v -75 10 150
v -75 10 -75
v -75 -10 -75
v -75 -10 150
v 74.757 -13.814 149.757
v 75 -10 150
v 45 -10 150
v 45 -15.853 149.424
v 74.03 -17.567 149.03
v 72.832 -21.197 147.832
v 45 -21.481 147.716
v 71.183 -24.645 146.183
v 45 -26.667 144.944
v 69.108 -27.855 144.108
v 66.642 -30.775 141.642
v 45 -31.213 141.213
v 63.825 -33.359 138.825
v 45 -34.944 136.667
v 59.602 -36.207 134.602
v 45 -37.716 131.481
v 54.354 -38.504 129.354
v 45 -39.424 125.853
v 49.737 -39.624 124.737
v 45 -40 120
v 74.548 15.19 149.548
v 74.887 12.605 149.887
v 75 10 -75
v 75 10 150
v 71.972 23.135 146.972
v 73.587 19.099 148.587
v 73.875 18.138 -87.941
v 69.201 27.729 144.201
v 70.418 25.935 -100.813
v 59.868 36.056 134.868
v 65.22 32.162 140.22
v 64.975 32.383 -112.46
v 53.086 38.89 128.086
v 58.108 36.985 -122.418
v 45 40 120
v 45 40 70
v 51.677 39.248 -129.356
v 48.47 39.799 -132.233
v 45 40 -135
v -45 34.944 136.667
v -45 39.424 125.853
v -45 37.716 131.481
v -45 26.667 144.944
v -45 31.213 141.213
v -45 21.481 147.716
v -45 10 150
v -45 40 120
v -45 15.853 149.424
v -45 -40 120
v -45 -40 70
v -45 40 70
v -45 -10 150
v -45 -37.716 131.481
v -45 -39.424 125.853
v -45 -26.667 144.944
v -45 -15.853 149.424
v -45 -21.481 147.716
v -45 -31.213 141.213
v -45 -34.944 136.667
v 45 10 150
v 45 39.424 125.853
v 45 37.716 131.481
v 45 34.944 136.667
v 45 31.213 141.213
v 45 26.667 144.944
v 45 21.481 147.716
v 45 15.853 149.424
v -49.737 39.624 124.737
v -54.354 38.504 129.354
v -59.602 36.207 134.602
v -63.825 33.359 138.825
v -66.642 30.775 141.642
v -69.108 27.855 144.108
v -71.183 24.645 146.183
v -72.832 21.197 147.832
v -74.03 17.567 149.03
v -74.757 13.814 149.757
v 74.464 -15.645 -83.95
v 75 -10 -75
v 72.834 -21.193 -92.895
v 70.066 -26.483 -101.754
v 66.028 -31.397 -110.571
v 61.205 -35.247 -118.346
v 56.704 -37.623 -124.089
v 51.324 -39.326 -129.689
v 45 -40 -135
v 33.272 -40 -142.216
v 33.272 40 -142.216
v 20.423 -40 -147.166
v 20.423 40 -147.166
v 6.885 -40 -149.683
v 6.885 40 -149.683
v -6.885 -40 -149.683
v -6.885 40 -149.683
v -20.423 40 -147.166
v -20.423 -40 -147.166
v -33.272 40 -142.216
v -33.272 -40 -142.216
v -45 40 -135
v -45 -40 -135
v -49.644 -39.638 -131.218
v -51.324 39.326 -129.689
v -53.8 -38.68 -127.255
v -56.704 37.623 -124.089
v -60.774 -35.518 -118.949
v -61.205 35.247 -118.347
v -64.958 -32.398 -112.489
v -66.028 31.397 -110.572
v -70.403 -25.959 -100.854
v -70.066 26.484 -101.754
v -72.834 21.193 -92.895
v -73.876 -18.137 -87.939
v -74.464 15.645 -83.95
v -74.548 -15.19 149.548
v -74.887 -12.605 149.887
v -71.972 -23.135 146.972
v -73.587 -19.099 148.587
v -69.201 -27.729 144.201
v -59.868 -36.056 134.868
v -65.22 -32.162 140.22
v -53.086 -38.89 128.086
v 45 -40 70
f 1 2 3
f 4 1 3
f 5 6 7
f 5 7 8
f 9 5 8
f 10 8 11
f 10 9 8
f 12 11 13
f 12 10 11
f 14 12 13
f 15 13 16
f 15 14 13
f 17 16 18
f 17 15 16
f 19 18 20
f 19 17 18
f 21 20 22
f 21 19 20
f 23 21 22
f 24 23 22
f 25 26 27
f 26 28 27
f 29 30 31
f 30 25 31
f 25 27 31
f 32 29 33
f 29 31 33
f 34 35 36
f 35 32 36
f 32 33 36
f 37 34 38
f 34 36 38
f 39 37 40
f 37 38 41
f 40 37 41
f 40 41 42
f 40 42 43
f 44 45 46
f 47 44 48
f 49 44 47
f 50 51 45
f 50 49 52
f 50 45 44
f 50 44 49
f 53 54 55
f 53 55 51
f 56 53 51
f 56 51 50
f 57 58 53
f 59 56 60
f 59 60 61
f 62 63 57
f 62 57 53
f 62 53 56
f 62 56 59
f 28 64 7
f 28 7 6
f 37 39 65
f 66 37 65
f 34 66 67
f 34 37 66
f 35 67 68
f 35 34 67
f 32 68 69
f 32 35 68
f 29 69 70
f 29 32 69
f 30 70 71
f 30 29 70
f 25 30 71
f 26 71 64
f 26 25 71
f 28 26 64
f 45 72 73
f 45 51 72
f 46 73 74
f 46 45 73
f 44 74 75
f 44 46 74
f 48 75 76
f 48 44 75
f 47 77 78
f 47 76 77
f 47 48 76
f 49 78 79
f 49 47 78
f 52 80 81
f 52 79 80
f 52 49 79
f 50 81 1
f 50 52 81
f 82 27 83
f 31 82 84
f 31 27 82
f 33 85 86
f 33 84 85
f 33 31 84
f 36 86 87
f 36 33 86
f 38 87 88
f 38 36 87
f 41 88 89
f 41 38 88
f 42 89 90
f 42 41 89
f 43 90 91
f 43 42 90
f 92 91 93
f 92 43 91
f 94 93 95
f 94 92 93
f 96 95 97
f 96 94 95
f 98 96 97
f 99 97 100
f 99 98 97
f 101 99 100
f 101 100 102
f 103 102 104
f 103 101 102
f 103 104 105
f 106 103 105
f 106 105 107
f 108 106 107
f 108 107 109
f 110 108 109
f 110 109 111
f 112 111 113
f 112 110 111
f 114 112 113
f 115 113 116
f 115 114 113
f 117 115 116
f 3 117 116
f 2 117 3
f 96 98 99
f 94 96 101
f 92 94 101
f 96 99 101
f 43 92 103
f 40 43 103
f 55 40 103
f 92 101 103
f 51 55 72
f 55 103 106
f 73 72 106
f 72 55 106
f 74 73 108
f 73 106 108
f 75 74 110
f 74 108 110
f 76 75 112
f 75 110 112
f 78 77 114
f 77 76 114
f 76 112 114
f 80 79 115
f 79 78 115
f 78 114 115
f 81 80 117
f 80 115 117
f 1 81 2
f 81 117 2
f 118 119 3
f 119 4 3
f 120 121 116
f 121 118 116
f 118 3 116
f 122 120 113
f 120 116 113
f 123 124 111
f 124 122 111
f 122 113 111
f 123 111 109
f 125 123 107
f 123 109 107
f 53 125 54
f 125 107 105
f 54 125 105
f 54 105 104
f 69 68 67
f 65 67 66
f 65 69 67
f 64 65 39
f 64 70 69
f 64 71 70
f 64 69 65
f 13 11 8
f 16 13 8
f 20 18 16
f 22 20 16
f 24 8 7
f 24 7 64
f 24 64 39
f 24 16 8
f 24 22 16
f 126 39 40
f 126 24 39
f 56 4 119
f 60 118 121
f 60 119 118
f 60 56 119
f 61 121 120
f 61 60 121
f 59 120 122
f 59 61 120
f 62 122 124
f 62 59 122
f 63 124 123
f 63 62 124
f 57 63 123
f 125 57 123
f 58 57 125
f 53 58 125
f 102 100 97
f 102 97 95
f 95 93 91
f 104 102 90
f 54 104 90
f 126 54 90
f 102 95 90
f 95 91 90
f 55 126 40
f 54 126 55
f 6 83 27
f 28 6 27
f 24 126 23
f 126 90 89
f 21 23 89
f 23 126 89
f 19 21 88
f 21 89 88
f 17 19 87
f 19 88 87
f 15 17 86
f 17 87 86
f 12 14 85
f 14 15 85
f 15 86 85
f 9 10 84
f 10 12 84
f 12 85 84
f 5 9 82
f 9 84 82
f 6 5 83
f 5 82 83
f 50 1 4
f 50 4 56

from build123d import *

# Parameters (mm, degrees)
BOSS_EXTRUDE1_DEPTH      = 150
BOSS_EXTRUDE1_DEPTH_BACK = 150
SKETCH2_OUTSIDE_W        = 370.964
SKETCH2_OUTSIDE_H        = 150.964
CUT_EXTRUDE1_DEPTH       = 150
CUT_EXTRUDE2_REACH       = 187.809
SKETCH6_OUTSIDE_W        = 220.96400000000003
SKETCH6_OUTSIDE_H        = 370.964
CUT_EXTRUDE3_DEPTH       = 186.8090417606205


with BuildPart() as part:
    # Sketch1 → Boss-Extrude1 (new, two sides: drawn at the far end of the back side and taken through both)
    with BuildSketch(Plane.XY.offset(-BOSS_EXTRUDE1_DEPTH_BACK)):
        with BuildLine():
            Line((-44.999999999999986, -39.99999999999999), (45.000000000000014, -39.99999999999999))
            ThreePointArc((45.000000000000014, -39.99999999999999), (66.21320343559644, -31.21320343559642), (75.00000000000001, -10.000000000000002))
            Line((75.00000000000001, -10.000000000000002), (75.00000000000001, 10.000000000000002))
            ThreePointArc((75.00000000000001, 10.000000000000002), (66.21320343559645, 31.213203435596434), (45.000000000000014, 40.00000000000001))
            Line((45.000000000000014, 40.00000000000001), (-44.999999999999986, 40.00000000000001))
            ThreePointArc((-44.999999999999986, 40.00000000000001), (-66.21320343559641, 31.213203435596427), (-74.99999999999999, 10.000000000000002))
            Line((-74.99999999999999, 10.000000000000002), (-74.99999999999999, -10.000000000000002))
            ThreePointArc((-74.99999999999999, -10.000000000000002), (-66.2132034355964, -31.213203435596427), (-44.999999999999986, -39.99999999999999))
        make_face()
    extrude(amount=BOSS_EXTRUDE1_DEPTH + BOSS_EXTRUDE1_DEPTH_BACK)

    # Sketch2 outside → Cut-Extrude1 (cut)
    with BuildSketch(Plane(origin=(75.00000000000001, 0, 0), x_dir=(0, 0, -1), z_dir=(1, 0, 0))):
        Rectangle(SKETCH2_OUTSIDE_W, SKETCH2_OUTSIDE_H)
        with BuildLine():
            Line((150, 40.00000000000001), (-120, 39.999999999999986))
            ThreePointArc((-120, 39.999999999999986), (-141.21320343559643, 31.21320343559642), (-150, 9.999999999999991))
            Line((-150, 9.999999999999991), (-150, -9.999999999999991))
            ThreePointArc((-150, -9.999999999999991), (-141.21320343559643, -31.213203435596412), (-120, -39.999999999999986))
            Line((-120, -39.999999999999986), (150, -39.999999999999964))
            Line((150, -39.999999999999964), (150, 40.00000000000001))
        make_face(mode=Mode.SUBTRACT)
    extrude(amount=-CUT_EXTRUDE1_DEPTH, mode=Mode.SUBTRACT)

    # Sketch3 → Cut-Extrude2 (cut, up to next)
    with BuildSketch(Plane.XZ.offset(39.99999999999999), mode=Mode.PRIVATE) as cut_extrude2_sk1:
        Polygon((-44.99999999999978, 150), (45, 150), (45.000000000000014, 69.99999999999999), (-44.99999999999977, 69.99999999999999), align=None)
    cut_extrude2_tool1 = extrude(cut_extrude2_sk1.sketch, amount=-CUT_EXTRUDE2_REACH, mode=Mode.PRIVATE) & part.part
    add(cut_extrude2_tool1.solids().sort_by_distance((0, -40, 110))[0], mode=Mode.SUBTRACT)

    # Sketch6 outside → Cut-Extrude3 (cut, through all)
    with BuildSketch(Plane(origin=(0, 40.00000000000001, 0), x_dir=(1, 0, 0), z_dir=(0, 1, 0))):
        Rectangle(SKETCH6_OUTSIDE_W, SKETCH6_OUTSIDE_H)
        with BuildLine():
            Line((-75, 75), (-74.99999999999999, 0))
            Line((-74.99999999999999, 0), (-74.99999999999999, -150))
            Line((-74.99999999999999, -150), (75.00000000000001, -150))
            Line((75.00000000000001, -150), (75.00000000000001, 0))
            Line((75.00000000000001, 0), (75, 75))
            ThreePointArc((75, 75), (-9.29e-15, 149.99999999999997), (-75, 75))
        make_face(mode=Mode.SUBTRACT)
    extrude(amount=-CUT_EXTRUDE3_DEPTH, mode=Mode.SUBTRACT)


solid = part.part
